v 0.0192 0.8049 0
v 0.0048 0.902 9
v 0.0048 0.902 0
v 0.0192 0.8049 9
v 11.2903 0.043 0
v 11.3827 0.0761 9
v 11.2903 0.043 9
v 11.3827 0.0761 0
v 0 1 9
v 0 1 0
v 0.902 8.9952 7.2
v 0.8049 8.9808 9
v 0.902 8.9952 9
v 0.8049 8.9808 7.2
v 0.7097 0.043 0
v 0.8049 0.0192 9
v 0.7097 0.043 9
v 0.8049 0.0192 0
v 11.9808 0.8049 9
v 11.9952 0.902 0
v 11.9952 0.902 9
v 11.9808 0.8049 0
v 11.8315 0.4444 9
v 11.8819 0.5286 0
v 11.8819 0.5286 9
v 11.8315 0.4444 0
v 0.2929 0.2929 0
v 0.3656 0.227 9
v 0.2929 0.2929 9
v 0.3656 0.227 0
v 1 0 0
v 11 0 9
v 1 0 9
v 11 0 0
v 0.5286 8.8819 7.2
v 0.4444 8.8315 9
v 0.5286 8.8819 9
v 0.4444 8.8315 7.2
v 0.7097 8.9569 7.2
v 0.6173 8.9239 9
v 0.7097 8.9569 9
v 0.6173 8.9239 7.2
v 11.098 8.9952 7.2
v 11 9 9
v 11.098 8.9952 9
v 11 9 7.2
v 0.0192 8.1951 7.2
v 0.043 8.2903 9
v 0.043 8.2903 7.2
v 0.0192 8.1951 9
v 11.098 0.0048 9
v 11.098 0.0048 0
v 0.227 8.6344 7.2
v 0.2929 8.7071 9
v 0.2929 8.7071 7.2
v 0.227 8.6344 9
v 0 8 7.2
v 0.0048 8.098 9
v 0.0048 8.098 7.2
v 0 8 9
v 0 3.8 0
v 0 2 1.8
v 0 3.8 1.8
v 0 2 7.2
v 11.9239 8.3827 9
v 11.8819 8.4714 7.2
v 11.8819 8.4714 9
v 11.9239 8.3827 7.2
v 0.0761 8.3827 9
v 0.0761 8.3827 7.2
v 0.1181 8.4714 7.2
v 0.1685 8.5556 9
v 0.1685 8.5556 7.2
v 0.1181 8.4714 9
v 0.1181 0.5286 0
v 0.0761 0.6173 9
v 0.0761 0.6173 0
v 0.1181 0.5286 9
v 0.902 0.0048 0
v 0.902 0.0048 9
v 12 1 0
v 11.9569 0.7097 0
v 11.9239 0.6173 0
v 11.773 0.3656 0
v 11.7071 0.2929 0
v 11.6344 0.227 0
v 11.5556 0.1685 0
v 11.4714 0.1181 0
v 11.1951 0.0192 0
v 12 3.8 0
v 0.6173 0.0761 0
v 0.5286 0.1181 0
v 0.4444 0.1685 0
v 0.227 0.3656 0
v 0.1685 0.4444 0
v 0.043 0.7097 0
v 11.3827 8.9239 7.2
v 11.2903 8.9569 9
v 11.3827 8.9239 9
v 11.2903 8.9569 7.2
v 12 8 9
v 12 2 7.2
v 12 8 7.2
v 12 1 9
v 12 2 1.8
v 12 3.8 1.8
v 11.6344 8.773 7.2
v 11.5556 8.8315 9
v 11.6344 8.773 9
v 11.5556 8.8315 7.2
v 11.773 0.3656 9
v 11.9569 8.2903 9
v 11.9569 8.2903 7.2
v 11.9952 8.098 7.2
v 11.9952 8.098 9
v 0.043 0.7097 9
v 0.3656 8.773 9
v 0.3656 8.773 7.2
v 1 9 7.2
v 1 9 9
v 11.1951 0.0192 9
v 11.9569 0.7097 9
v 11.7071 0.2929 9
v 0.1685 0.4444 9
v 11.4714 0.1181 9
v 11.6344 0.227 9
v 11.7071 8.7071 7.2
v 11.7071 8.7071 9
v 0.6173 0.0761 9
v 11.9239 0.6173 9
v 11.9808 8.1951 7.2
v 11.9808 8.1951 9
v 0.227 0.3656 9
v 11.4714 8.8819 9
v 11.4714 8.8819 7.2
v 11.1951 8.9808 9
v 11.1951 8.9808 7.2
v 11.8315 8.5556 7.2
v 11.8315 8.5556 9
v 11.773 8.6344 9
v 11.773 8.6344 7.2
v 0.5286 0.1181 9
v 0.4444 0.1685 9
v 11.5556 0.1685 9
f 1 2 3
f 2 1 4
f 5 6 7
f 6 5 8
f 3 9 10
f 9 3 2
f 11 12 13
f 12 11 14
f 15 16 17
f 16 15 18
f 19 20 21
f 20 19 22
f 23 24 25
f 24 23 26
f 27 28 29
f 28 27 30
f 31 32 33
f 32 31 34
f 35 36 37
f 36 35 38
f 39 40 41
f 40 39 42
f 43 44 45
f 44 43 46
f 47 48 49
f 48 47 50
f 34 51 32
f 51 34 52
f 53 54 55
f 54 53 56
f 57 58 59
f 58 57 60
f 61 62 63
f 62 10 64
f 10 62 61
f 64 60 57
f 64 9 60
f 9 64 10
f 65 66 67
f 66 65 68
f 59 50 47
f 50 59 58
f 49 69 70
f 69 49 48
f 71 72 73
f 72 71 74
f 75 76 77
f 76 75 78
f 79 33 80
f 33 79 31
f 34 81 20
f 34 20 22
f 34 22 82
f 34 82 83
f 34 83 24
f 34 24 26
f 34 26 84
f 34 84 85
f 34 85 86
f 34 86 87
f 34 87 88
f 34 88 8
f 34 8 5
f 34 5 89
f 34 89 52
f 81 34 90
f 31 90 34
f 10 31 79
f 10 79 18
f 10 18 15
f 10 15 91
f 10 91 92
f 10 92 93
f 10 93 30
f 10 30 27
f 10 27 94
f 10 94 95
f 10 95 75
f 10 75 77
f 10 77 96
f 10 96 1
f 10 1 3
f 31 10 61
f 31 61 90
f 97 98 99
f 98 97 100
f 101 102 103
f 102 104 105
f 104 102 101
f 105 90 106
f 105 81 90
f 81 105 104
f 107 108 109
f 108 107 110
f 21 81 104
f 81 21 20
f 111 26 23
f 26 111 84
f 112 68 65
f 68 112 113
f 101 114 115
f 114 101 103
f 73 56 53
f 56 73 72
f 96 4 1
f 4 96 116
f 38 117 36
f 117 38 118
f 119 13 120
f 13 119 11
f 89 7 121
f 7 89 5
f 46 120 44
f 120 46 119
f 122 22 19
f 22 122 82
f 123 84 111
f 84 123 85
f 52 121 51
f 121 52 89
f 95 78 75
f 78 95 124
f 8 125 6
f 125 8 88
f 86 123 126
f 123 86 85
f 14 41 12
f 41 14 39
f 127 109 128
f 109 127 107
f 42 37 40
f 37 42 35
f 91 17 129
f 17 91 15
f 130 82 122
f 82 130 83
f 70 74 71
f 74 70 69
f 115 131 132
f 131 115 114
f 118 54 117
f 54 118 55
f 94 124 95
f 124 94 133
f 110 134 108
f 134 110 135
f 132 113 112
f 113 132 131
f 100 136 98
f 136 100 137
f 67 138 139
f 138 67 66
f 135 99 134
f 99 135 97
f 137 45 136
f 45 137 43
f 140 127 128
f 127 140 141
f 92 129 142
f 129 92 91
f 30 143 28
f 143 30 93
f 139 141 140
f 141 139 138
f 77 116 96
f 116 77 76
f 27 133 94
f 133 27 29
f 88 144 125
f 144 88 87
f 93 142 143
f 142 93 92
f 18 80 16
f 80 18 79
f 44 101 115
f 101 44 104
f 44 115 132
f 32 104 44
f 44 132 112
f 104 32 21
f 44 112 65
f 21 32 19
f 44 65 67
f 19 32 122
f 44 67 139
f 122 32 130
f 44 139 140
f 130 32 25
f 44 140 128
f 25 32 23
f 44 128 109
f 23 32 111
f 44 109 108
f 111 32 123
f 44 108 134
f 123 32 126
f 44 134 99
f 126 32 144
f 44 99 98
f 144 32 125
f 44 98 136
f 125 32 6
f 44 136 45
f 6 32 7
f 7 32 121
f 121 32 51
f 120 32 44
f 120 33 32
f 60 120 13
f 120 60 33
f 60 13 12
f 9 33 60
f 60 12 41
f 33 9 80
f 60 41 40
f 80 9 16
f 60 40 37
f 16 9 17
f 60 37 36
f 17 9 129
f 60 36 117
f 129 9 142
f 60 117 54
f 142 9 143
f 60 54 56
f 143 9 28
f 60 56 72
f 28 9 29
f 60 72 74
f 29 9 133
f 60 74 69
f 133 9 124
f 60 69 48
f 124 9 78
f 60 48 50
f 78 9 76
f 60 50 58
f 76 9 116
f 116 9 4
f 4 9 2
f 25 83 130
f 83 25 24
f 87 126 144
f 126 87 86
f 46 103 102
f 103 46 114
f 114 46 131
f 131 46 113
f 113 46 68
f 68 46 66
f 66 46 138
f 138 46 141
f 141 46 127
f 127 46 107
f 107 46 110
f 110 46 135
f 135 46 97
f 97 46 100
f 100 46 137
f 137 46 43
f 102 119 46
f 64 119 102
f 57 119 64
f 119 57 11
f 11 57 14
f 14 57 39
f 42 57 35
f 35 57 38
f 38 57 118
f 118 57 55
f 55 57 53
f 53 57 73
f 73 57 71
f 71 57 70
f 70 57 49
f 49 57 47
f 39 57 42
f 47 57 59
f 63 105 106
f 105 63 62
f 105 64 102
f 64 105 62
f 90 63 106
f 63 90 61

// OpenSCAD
// file: ../../v2/volume.scad
// Capacity is the rounded open vessel plus the portion of the side well outside it.
function round_bath(w,d,r,h) = h<=0 ? 0 : h<r ?
    let(dz=h/80) dz*total([for(i=[0:79])
        let(z=(i+0.5)*dz,b=r-sqrt(max(0,r*r-pow(r-z,2))))
            (w-2*b)*(d-2*b)-(4-PI)*pow(r-b,2)]) :
    (w*d-(4-PI)*r*r)*(h-r)+(w-2*r)*(d-2*r)*r+
        (w+d-4*r)*PI*r*r/2+2*PI*r*r*r/3;
function stops_volume(level) =
    let(r=2,h=bottom_clearance-r,zc=floor+h,cap=clamp(level-zc,0,r))
        2*(PI*r*r*clamp(level-floor,0,h)+PI*(r*r*cap-pow(cap,3)/3));
function paper_displacement(level,lift=0) = roll_width*paper_thickness*
    clamp(level-paper_bottom-lift,0,paper_cut_length);
function circle_right(r,x) = x<=-r ? PI*r*r : x>=r ? 0 :
    r*r*(90-asin(x/r))*PI/180-x*sqrt(max(0,r*r-x*x));
function well_interval(a,b,level,steps=12) = level<=a[0] ? 0 :
    let(top=min(level,b[0]),dz=(top-a[0])/steps)
    dz*total([for(i=[0:steps-1])
        let(t=((a[0]+(i+0.5)*dz)-a[0])/(b[0]-a[0]),
            cx=lerp(a[1],b[1],t),r=lerp(a[2],b[2],t))
        circle_right(r,body_width-wall-cx)]);
function well_volume(level) = total([for(i=[0:len(well_stations)-2])
    well_interval(well_stations[i],well_stations[i+1],level)]);
function capacity(level) = round_bath(inner_width,bath_gap,inside_radius,level-floor)-
    stops_volume(level)+well_volume(level);
function level_for_volume(v,loaded=false,lo=floor,hi=body_height,n=24,lift=0) = n==0 ? (lo+hi)/2 :
    let(mid=(lo+hi)/2,available=capacity(mid)-(loaded?paper_displacement(mid,lift):0))
    available<v ? level_for_volume(v,loaded,mid,hi,n-1,lift) :
        level_for_volume(v,loaded,lo,mid,n-1,lift);
// file: ../../v2/guide.scad
module slot_slice(gap,z) {
    translate([(body_width-slit_length)/2,body_depth/2-gap/2,z])
        rr(slit_length,gap,eps,min(gap/2,0.6));
}
module guide(id=0,gap=guide_gap,closed=false) {
    difference() {
        union() {
            translate([-(rim_overhang+guide_fit),-(rim_overhang+guide_fit),0])
                rr(guide_width,guide_depth,guide_thickness,1.5);
            // Locating skirt ends above the liquid, so there is no submerged joint.
            translate([wall+guide_fit,wall+guide_fit,-guide_skirt]) difference() {
                rr(inner_width-2*guide_fit,bath_gap-2*guide_fit,guide_skirt+eps,inside_radius);
                translate([1.5,1.5,-eps]) rr(inner_width-2*guide_fit-3,bath_gap-2*guide_fit-3,guide_skirt+2*eps,1);
            }
            translate([9,-rim_overhang-guide_fit+0.2,0.6]) rotate([90,0,0]) tactile(id+1,1.8);
        }
        if(!closed) {
            low=guide_thickness-drip_depth-wiping_land;
            hull() { slot_slice(gap+4,-guide_skirt-eps); slot_slice(gap,low); }
            hull() { slot_slice(gap,low-eps); slot_slice(gap,low+wiping_land+eps); }
            hull() { slot_slice(gap,guide_thickness-drip_depth); slot_slice(gap+4,guide_thickness+eps); }

        }
        translate([body_width-12,body_depth/2,guide_thickness-0.6])
            linear_extrude(0.7) text(str(id==0?"A":"B",closed?"":str(" ",gap)),size=3,
                halign="center",valign="center",font="Liberation Sans:style=Bold");
    }
}
module retaining_clip() {
    // Slides over the front rim and the guide. No holes enter the vessel.
    difference() {
        rr(clip_width,9,9,1);
        translate([-eps,2,1.8]) cube([clip_width+2*eps,8,5.4]);
        // The lower jaw catches only the projecting rim, not the vessel wall below it.
        translate([-eps,3.8,-eps]) cube([clip_width+2*eps,6,1.8+eps]);
    }
}
module clip_print() { translate([0,0,clip_width]) rotate([0,90,0]) retaining_clip(); }
module installed_clips() {
    for(x=[body_width/4,body_width*3/4])
        translate([x-clip_width/2,-4.2,body_height-2.2-1.8]) retaining_clip();
}
module guide_print(id=0,gap=guide_gap,closed=false) {
    // Top on bed: the shallow underside taper rises without an internal support.
    translate([rim_overhang+guide_fit,body_depth,guide_thickness])
        rotate([180,0,0]) guide(id,gap,closed);
}
// file: ../../v2/geometry.scad
module rr(w,d,h,r=2) {
    linear_extrude(h) hull() for(x=[r,w-r]) for(y=[r,d-r]) translate([x,y]) circle(r=r);
}
module rounded_bath_void() {
    hull() for(x=[wall+inside_radius,body_width-wall-inside_radius])
        for(y=[wall+inside_radius,body_depth-wall-inside_radius])
            for(z=[floor+inside_radius,body_height+10])
                translate([x,y,z]) sphere(r=inside_radius);
}
module bottom_stops() {
    for(x=[body_width/3,body_width*2/3]) translate([x,body_depth/2,floor-eps]) {
        cylinder(r=2,h=bottom_clearance-2+eps);
        translate([0,0,bottom_clearance-2+eps]) sphere(r=2);
    }
}
// Circular horizontal sections; a continuously descending passage has no blind sump.
module well_loft(extra=0,extend=0) {
    rings=[for(s=well_stations) [s[0]+(s[0]==well_top?extend:0),s[1],s[2]+extra]];
    n=$fn;
    vertices=[for(s=rings) for(j=[0:n-1])
        [s[1]+s[2]*cos(j*360/n),well_cy+s[2]*sin(j*360/n),s[0]]];
    faces=concat(
        [[for(j=[0:n-1]) j]],
        [for(k=[0:len(rings)-2]) for(j=[0:n-1])
            [k*n+j,(k+1)*n+j,(k+1)*n+(j+1)%n,k*n+(j+1)%n]],
        [[for(j=[n-1:-1:0]) (len(rings)-1)*n+j]]);
    intersection() {
        polyhedron(vertices,faces,convexity=12);
        // Flat rear surface lets the bowl and vessel meet the same heat spreader.
        translate([-vessel_xmax,-100,-1]) cube([3*vessel_xmax,body_depth+100,body_height+extend+3]);
    }
}
module well_frame(id=0) {
    if(id==0) translate([body_width,0,0]) mirror([1,0,0]) children();
    else children();
}
module liquid_void(id=0) {
    difference() {
        union() { rounded_bath_void(); well_frame(id) well_loft(0,2); }
        bottom_stops();
    }
}
module tactile(n,size=8) {
    for(i=[0:n-1]) translate([i*4,0,0]) rr(2,size,1,0.9);
}
module front_text(s,x,z,size,depth=0.6) {
    translate([x,-eps,z]) rotate([90,0,0])
        linear_extrude(depth+eps) text(s,size=size,halign="center",valign="center",font="Liberation Sans:style=Bold");
}
module paper(lift=0,side=0) {
    translate([wall+side_clearance+side,body_depth/2-paper_thickness/2,paper_bottom+lift])
        cube([roll_width,paper_thickness,paper_cut_length]);
}
// file: ../../v2/parameters.scad
// V2: dimensions are millimetres. All parts derive from this one configuration.
/* [Image and roll] */
roll_width = 102;
image_aspect = 16/9; // Long image dimension / roll width. 2 gives a wider panorama.
paper_thickness = 0.3;
finger_grip = 8;
/* [Agitation] */
vertical_stroke = 6; // Lift from the two rounded bottom-edge stops.
lateral_stroke = 3; // Movement either side of centre.
immersion_margin = 2; // Image stays this far under liquid at the top of the stroke.
side_clearance = 10;
bottom_clearance = 4;
bath_gap = 14;
freeboard = 7; // Loaded liquid to the bare vessel rim; includes slosh reserve.
/* [Vessel] */
wall = 3;
floor = 4;
inside_radius = 2;
rim_overhang = 1.8;
rim_height = 2;
/* [Removable guide] */
guide_gap = 1.2; // Gentle default. Also export 0.8 and 0.6 mm trial inserts.
guide_thickness = 3;
guide_fit = 0.35;
guide_skirt = 2;
drip_depth = 1.5;
wiping_land = 0.4;
/* [Fill cue] */
sight_depth = 1.5;
well_bore = 8;
well_mouth = 16;
well_wall = 2.4;
well_flare = 9;
/* [Chemistry] */
recipe_a_concentrate = 1;
recipe_a_water = 4;
recipe_b_concentrate = 1;
recipe_b_water = 4;
recipe_a = [recipe_a_concentrate,recipe_a_water]; // Concentrate : water. User recipe; not a universal RA-4 recipe.
recipe_b = [recipe_b_concentrate,recipe_b_water]; // Independent of A, even when the volumes match.
rounding_limit = 2;
/* [Cradle and heater] */
module_gap = 2; // Separate modules joined with removable printed links.
cradle_floor = 4;
cradle_clearance = 0.6;
heater_width = 140; // One nominal 5 W mat per chamber.
heater_height = 150;
heater_thickness = 3;
heat_spreader_thickness = 1.5;
thermal_pad = 0.5; // Compliant external interface, separate from the printed liquid wall.
guard_gap = 10; // Keep at least 10 mm clear behind the mat.
guard_thickness = 2.4;
/* [Printing] */
build_size = [180,180,180];
bed_margin = 3;
height_margin = 2;
print_tilt = 44.2;
$fn = 64;
eps = 0.02;

function clamp(v,lo,hi) = min(hi,max(lo,v));
function total(v,i=0) = i==len(v) ? 0 : v[i]+total(v,i+1);
function lerp(a,b,t) = a+(b-a)*t;
function smooth(t) = t*t*(3-2*t);
function gcd(a,b) = b==0 ? a : gcd(b,a%b);
function rounded_ml(v,parts,lo,hi) =
    let(batch=total(parts)/gcd(parts[0],parts[1]), exact=round(v/batch)*batch)
    abs(exact-v)<=rounding_limit && exact>=lo && exact<=hi ? exact :
    clamp(round(v),ceil(lo),floor(hi));
function mix_ml(v,parts) = let(first=round(v*parts[0]/total(parts))) [first,v-first];

image_length = roll_width*image_aspect;
inner_width = roll_width+2*side_clearance;
body_width = inner_width+2*wall;
body_depth = bath_gap+2*wall;
paper_bottom = floor+bottom_clearance;
image_top = paper_bottom+image_length;
target_loaded_level = image_top+vertical_stroke+immersion_margin;
body_height = target_loaded_level+freeboard;
guide_top = body_height+guide_thickness;
paper_cut_length = ceil(guide_top+finger_grip-paper_bottom);
paper_top = paper_bottom+paper_cut_length;
trim_band = paper_cut_length-image_length;
guide_width = body_width+2*(rim_overhang+guide_fit);
guide_depth = body_depth+rim_overhang+guide_fit; // Rear edge stays flush against the heat spreader.
slit_length = roll_width+2*(lateral_stroke+1);
bath_area = inner_width*bath_gap-(4-PI)*inside_radius*inside_radius;
// First estimate only locates the bowl. Actual empty/loaded levels use the volume solver.
pool_z = target_loaded_level-roll_width*paper_thickness*
    (target_loaded_level-paper_bottom)/bath_area-sight_depth;
well_cx = body_width+well_bore/2+wall;
well_cy = body_depth/2;
well_exit_z = pool_z-(well_cx-(body_width-wall-well_bore/2));
well_top = body_height;
function well_at(z) = z<=pool_z ? [well_cx-(pool_z-z),well_bore/2] :
    [well_cx,lerp(well_bore/2,well_mouth/2,smooth(clamp((z-pool_z)/well_flare,0,1)))];
well_stations = concat(
    [for(i=[0:16]) let(z=lerp(well_exit_z,pool_z,i/16),s=well_at(z)) [z,s[0],s[1]]],
    [for(i=[1:16]) let(z=lerp(pool_z,well_top,i/16),s=well_at(z)) [z,s[0],s[1]]]);
vessel_xmax = well_cx+well_mouth/2+well_wall;
// Heater width never changes the vessel positions or the printable base.
cradle_width = body_width+2*(vessel_xmax-body_width)+8;
vessel_y = 24;
clip_width = 12;
clamp_width = 14;
spreader_width = heater_width+16;
spreader_height = heater_height+32;
spreader_left = (cradle_width-spreader_width)/2;
heater_y = vessel_y+body_depth+thermal_pad;
guard_y = heater_y+heat_spreader_thickness+heater_thickness+guard_gap+guard_thickness;
cradle_depth = max(68,guard_y+6.6);
vessel_pitch = cradle_depth+module_gap;
guard_tile_width = spreader_width;
guard_tile_height = spreader_height/2;
spreader_bottom = cradle_floor+3;
spreader_top = spreader_bottom+spreader_height;
strap_z = cradle_floor+body_height*0.5;
pad_height = min(body_height-12,spreader_top-cradle_floor-6);
function vessel_x(id=0) = (cradle_width-body_width)/2;
module module_position(id=0,explode=0) { translate([0,id*(vessel_pitch+explode),0]) children(); }
module vessel_position(id=0,lift=0) { translate([vessel_x(id),vessel_y,cradle_floor+lift]) children(); }

include <volume.scad>
nominal_ml = (capacity(target_loaded_level)-paper_displacement(target_loaded_level))/1000;
min_ml = max(capacity(pool_z+0.5),
    capacity(image_top+vertical_stroke+1)-paper_displacement(image_top+vertical_stroke+1))/1000+0.12;
max_ml = min(capacity(pool_z+2.5),
    capacity(body_height-6)-paper_displacement(body_height-6))/1000-0.12;
// Equal vessels share a volume. Recipe A can prefer an exact batch; B is independent.
working_ml = rounded_ml(nominal_ml,recipe_a,min_ml,max_ml);
empty_level = level_for_volume(working_ml*1000);
loaded_level = level_for_volume(working_ml*1000,true);
amounts_a = mix_ml(working_ml,recipe_a);
amounts_b = mix_ml(working_ml,recipe_b);
actual_sight_depth = empty_level-pool_z;
visible_pool_ml = (well_volume(empty_level)-well_volume(pool_z))/1000;
usable_xy = [build_size[0]-2*bed_margin,build_size[1]-2*bed_margin];
usable_z = build_size[2]-height_margin;
vessel_print_bounds = [vessel_xmax+rim_overhang,
    body_height*sin(print_tilt)+(body_depth+rim_overhang)*cos(print_tilt),
    body_height*cos(print_tilt)+max(body_depth,well_cy+well_mouth/2+well_wall)*sin(print_tilt)];

module valid() {
    assert(roll_width>40 && image_aspect>=1 && image_aspect<=3);
    assert(paper_thickness>0 && guide_gap>=paper_thickness+0.2);
    assert(side_clearance>=lateral_stroke+3 && bath_gap>=well_bore+2);

    assert(vertical_stroke>=0 && lateral_stroke>=0 && immersion_margin>=1);
    assert(wall>=2.4 && floor>=3 && inside_radius>0 && inside_radius<bath_gap/2);
    assert(bottom_clearance>=4 && freeboard>=7 && finger_grip>=6);
    assert(guide_fit>=0.15 && guide_fit<=0.7 && guide_skirt<freeboard-1);
    assert(drip_depth+wiping_land<guide_thickness && drip_depth>=1);
    assert(well_mouth>=well_bore && well_bore>=6 && well_wall>=2);
    assert(body_depth>=well_mouth+4,"The flat rear of the bowl needs at least 2 mm of wall.");
    assert(pool_z+well_flare<=well_top && well_exit_z>floor+inside_radius);
    assert(min(recipe_a)>0 && min(recipe_b)>0 && floor(recipe_a[0])==recipe_a[0] && floor(recipe_a[1])==recipe_a[1]);
    assert(floor(recipe_b[0])==recipe_b[0] && floor(recipe_b[1])==recipe_b[1]);
    assert(min_ml<=working_ml && working_ml<=max_ml && abs(working_ml-nominal_ml)<=rounding_limit);
    assert(loaded_level>=image_top+vertical_stroke+1 && body_height-loaded_level>=6);
    assert(actual_sight_depth>=0.5 && actual_sight_depth<=2.5);
    assert(print_tilt>=40 && print_tilt<=45);
    assert(thermal_pad>=0 && thermal_pad<=2 && guard_gap>=10 && guard_gap<=20);
    assert(heater_thickness>=1 && heater_thickness<=8 && heat_spreader_thickness>=1 && heat_spreader_thickness<=3);
    assert(heater_width>=body_width+12 && heater_width<=150 && heater_height>=140 && heater_height<=150);
    assert(heater_y+heat_spreader_thickness+heater_thickness+guard_gap+guard_thickness<cradle_depth);
    assert(pad_height>0 && spreader_top<body_height+cradle_floor-10);
    assert(guard_tile_width<=usable_xy[0] && guard_tile_height<=usable_xy[1]);
    assert(cradle_width<=usable_xy[0] && cradle_depth<=usable_xy[1],"Module base exceeds the printer bed.");
    assert(vessel_print_bounds[0]<=usable_xy[0] && vessel_print_bounds[1]<=usable_xy[1] &&
        vessel_print_bounds[2]<=usable_z,"Image size and clearance exceed the A1 mini in the documented tilted orientation.");
    children();
}
// main file
include <../../v2/parameters.scad>
include <../../v2/geometry.scad>
include <../../v2/guide.scad>
retaining_clip();
